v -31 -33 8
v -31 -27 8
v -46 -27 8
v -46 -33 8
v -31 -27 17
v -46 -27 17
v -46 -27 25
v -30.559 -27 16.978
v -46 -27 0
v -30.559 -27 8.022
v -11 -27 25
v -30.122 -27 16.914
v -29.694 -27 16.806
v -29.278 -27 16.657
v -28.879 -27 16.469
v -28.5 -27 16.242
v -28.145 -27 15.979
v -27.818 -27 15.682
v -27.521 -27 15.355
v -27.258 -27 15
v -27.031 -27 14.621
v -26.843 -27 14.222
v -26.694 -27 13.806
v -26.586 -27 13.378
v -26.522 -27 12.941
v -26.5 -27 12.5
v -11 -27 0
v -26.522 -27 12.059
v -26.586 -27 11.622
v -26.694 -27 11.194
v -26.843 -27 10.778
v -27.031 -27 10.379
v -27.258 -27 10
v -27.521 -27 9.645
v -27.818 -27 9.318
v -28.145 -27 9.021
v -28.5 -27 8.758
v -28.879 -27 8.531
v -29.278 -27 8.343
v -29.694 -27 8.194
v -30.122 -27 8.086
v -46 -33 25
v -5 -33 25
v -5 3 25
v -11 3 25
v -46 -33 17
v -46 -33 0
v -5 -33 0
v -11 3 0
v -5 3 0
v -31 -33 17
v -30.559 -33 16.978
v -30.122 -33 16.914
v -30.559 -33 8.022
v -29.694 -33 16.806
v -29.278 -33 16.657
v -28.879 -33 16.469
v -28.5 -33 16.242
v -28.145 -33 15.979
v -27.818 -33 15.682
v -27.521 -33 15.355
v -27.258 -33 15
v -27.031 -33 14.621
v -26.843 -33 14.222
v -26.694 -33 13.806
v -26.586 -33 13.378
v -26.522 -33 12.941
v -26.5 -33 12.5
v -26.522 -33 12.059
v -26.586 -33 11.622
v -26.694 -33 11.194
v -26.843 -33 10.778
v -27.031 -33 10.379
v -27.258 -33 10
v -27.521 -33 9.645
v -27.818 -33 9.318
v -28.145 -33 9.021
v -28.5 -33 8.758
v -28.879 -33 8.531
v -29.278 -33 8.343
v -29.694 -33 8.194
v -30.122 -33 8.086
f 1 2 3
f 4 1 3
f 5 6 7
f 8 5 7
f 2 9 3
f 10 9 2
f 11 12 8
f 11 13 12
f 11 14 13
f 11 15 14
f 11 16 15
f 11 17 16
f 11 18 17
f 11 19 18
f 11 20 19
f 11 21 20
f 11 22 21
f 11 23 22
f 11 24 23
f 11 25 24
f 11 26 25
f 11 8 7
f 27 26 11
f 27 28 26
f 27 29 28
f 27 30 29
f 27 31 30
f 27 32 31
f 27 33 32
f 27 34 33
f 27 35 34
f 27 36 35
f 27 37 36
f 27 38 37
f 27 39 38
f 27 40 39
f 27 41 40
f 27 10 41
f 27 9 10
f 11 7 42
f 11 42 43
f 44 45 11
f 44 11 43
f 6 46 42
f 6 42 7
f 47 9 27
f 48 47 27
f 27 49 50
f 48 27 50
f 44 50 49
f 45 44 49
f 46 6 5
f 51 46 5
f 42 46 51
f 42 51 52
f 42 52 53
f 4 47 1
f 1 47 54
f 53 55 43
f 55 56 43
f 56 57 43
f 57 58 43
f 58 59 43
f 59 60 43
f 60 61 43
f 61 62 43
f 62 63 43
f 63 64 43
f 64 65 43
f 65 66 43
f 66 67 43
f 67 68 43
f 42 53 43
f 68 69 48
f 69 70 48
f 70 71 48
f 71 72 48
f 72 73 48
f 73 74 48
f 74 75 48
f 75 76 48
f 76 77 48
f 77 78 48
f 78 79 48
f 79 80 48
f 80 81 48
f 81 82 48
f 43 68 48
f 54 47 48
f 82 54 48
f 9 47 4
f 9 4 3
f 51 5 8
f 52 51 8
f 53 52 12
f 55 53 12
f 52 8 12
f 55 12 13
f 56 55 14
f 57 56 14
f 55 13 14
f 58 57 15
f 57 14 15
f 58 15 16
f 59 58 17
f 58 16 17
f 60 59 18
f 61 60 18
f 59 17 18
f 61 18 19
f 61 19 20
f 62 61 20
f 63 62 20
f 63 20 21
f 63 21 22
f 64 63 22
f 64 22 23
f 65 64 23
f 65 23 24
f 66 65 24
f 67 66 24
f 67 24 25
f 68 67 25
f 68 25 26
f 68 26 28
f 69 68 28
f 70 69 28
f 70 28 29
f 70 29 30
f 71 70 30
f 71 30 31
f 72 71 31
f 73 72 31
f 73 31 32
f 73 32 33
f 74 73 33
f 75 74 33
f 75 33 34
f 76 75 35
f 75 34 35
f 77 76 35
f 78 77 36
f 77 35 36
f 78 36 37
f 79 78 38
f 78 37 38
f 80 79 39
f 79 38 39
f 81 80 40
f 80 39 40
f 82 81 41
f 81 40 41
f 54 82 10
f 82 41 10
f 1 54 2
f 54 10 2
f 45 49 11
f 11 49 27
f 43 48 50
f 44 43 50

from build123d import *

# Parameters (mm, degrees)
F0_W     = 35
F0_H     = 6
F1_DEPTH = 25
F3_DEPTH = 25
F4_DEPTH = 25


# Not quite as in the source:
# - a feature names something its author has since deleted; it is built from what else it names


with BuildPart() as f1:
    # F0 (on Top) → F1 (new body)
    with BuildSketch(Plane.XY):
        with Locations((-28.5, -30)):
            Rectangle(F0_W, F0_H)
        Polygon((-5, 3), (-11, 3), (-11, -3), (-11, -27), (-11, -33), (-5, -33), (-5, -3), align=None)
    extrude(amount=F1_DEPTH)

    # F2 (on face) → F3 (cut)
    with BuildSketch(Plane(origin=(0, -27, 0), x_dir=(-1, 0, 0), z_dir=(0, 1, 0))):
        with BuildLine():
            ThreePointArc((31, 8), (34.1819805153, 9.3180194847), (35.5, 12.5))
            ThreePointArc((35.5, 12.5), (34.1819805153, 15.6819805153), (31, 17))
            ThreePointArc((31, 17), (26.5, 12.5), (31, 8))
        make_face()
    extrude(amount=-F3_DEPTH, mode=Mode.SUBTRACT)

    # F2 (on face) → F4 (cut)
    with BuildSketch(Plane(origin=(0, -27, 0), x_dir=(-1, 0, 0), z_dir=(0, 1, 0))):
        with BuildLine():
            ThreePointArc((31, 17), (34.1819805153, 15.6819805153), (35.5, 12.5))
            ThreePointArc((35.5, 12.5), (34.1819805153, 9.3180194847), (31, 8))
            Line((31, 8), (46, 8))
            Line((46, 8), (46, 17))
            Line((46, 17), (31, 17))
        make_face()
    extrude(amount=-F4_DEPTH, mode=Mode.SUBTRACT)


solid = f1.part
